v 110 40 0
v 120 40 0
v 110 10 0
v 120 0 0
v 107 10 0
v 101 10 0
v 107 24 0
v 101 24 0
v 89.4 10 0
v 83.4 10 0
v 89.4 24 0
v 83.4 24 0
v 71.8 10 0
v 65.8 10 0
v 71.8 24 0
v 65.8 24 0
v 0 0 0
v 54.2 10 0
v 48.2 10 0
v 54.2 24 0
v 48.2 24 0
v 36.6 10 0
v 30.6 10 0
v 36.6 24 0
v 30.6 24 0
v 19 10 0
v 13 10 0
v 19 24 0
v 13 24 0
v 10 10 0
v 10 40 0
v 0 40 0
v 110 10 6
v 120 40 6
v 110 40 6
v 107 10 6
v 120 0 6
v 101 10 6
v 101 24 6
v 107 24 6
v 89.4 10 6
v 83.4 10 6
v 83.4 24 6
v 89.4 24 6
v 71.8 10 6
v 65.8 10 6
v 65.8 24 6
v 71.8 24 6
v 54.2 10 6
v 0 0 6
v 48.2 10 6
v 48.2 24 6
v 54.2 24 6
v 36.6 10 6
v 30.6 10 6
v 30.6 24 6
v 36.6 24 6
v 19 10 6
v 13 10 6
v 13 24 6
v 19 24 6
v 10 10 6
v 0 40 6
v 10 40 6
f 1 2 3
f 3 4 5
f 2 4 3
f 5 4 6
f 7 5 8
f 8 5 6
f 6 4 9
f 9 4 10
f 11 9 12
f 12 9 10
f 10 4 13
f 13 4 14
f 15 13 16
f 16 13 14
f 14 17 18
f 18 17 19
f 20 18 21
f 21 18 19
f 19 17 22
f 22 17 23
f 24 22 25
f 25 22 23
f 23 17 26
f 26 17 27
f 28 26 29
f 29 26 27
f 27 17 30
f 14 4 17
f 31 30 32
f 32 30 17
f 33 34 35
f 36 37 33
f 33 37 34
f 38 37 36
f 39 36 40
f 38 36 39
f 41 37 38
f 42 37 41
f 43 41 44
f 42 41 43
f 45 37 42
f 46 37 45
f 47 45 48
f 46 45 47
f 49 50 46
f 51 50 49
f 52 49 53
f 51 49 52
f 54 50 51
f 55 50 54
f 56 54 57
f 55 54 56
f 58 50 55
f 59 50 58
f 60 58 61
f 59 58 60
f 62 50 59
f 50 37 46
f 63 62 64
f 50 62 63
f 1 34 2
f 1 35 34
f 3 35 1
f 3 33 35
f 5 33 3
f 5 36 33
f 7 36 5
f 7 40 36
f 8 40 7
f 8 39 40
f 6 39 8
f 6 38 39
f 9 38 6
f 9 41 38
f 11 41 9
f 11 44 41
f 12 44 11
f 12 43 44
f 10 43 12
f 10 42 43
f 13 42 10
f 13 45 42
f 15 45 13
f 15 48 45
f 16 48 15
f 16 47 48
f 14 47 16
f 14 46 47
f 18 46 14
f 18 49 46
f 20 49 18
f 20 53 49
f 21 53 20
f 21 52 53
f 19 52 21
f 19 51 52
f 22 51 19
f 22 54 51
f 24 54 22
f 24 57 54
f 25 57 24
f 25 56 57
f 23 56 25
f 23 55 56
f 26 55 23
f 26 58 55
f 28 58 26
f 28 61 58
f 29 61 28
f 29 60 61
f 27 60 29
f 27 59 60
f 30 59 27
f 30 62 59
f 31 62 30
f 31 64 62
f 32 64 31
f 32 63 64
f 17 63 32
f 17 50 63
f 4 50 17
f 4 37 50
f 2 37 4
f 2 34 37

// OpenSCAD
$fn = 32;

// ----------------------------------------------------------------------
// Guard grille: 6 slats over a 120 x 40 mm plate
// ----------------------------------------------------------------------

// --- parameters (mm) ---
profile_height = 6;       // extrusion height
profile_points = 32;      // points of the closed outline

profile = [[0, 0], [120, 0], [120, 40], [110, 40], [110, 10], [107, 10], [107, 24], [101, 24], [101, 10], [89.4, 10], [89.4, 24], [83.4, 24], [83.4, 10], [71.8, 10], [71.8, 24], [65.8, 24], [65.8, 10], [54.2, 10], [54.2, 24], [48.2, 24], [48.2, 10], [36.6, 10], [36.6, 24], [30.6, 24], [30.6, 10], [19, 10], [19, 24], [13, 24], [13, 10], [10, 10], [10, 40], [0, 40]];  // single closed polygon, 32 points, counter clockwise

// --- the one profile operation ---
linear_extrude(height = profile_height) polygon(points = profile);
